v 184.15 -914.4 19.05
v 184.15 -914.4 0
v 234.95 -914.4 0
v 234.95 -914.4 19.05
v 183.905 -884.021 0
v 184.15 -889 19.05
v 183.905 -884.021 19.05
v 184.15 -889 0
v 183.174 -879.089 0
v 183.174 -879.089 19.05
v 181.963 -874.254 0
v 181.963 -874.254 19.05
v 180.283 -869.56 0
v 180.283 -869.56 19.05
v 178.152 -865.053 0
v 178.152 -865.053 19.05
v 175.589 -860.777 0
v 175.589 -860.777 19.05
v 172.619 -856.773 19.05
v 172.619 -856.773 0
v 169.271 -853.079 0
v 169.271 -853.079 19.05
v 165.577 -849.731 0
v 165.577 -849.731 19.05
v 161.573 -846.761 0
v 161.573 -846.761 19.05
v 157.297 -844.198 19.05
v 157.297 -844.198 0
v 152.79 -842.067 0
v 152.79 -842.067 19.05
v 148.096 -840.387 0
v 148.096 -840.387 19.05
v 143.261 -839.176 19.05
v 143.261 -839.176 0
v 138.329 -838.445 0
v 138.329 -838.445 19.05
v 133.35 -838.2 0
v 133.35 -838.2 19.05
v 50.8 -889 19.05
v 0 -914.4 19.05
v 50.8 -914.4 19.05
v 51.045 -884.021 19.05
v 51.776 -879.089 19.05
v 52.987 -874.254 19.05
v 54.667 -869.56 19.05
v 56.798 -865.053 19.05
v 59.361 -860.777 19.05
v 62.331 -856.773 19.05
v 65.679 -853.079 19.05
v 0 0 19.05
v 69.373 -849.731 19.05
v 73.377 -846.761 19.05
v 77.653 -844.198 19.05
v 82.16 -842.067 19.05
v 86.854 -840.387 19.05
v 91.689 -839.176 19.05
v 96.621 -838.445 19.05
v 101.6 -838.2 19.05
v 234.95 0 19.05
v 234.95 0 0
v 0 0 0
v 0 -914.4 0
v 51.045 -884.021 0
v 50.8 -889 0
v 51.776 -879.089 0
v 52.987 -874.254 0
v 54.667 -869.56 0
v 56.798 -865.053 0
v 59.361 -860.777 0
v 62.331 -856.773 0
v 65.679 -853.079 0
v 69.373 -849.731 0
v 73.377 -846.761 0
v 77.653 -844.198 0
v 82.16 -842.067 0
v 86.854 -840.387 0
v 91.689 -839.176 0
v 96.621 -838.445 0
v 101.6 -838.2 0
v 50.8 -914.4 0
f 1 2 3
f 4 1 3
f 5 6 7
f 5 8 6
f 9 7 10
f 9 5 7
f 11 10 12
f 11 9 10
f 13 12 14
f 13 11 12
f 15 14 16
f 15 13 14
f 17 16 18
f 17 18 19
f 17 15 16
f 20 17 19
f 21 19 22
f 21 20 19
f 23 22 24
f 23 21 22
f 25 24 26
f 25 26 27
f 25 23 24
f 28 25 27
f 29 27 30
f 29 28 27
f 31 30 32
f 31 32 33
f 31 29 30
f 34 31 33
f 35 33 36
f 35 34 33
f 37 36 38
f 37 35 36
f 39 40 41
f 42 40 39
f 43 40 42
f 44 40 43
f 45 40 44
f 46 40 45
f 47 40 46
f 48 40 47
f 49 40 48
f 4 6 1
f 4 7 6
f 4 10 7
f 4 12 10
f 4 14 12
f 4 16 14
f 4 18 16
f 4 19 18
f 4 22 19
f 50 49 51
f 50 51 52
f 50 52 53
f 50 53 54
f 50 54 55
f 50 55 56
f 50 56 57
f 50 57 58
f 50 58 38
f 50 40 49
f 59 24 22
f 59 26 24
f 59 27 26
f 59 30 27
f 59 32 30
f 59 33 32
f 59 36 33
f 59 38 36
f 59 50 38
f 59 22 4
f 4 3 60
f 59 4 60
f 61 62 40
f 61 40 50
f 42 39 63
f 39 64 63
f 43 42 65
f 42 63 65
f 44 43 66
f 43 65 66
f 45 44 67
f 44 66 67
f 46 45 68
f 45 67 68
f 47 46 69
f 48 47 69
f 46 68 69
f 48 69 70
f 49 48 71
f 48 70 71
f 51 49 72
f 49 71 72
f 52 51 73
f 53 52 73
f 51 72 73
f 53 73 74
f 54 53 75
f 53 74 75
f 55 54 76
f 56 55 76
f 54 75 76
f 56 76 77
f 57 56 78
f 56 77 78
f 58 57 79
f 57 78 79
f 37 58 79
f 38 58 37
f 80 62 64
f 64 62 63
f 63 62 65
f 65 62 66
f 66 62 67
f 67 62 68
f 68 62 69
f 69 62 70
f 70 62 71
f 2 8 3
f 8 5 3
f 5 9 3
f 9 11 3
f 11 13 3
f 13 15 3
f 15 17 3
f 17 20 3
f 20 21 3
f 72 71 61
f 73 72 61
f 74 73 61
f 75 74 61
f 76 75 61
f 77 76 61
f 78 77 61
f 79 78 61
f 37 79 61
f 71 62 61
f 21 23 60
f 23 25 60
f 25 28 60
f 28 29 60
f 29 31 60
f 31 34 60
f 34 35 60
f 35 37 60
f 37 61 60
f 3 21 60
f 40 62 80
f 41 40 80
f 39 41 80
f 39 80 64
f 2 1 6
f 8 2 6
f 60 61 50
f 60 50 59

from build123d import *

# Parameters (mm, degrees)
F0_W     = 234.95
F0_H     = 914.4
F1_DEPTH = 19.05
F2_W     = 133.35
F2_H     = 76.2
F3_DEPTH = 19.05
F4_R     = 50.8


with BuildPart() as f1:
    # F0 (on Top) → F1 (new body)
    with BuildSketch(Plane.XY):
        with Locations((117.475, -457.2)):
            Rectangle(F0_W, F0_H)
    extrude(amount=F1_DEPTH)

    # F2 (on face) → F3 (cut)
    with BuildSketch(Plane.XY.offset(19.05)):
        with Locations((117.475, -876.3)):
            Rectangle(F2_W, F2_H)
    extrude(amount=-F3_DEPTH, mode=Mode.SUBTRACT)

    # F4
    f4_edges = [f1.edges().sort_by_distance(p)[0] for p in [
        (50.8, -838.2, 9.525),
        (184.15, -838.2, 9.525),
    ]]
    fillet(f4_edges, radius=F4_R)


solid = f1.part
